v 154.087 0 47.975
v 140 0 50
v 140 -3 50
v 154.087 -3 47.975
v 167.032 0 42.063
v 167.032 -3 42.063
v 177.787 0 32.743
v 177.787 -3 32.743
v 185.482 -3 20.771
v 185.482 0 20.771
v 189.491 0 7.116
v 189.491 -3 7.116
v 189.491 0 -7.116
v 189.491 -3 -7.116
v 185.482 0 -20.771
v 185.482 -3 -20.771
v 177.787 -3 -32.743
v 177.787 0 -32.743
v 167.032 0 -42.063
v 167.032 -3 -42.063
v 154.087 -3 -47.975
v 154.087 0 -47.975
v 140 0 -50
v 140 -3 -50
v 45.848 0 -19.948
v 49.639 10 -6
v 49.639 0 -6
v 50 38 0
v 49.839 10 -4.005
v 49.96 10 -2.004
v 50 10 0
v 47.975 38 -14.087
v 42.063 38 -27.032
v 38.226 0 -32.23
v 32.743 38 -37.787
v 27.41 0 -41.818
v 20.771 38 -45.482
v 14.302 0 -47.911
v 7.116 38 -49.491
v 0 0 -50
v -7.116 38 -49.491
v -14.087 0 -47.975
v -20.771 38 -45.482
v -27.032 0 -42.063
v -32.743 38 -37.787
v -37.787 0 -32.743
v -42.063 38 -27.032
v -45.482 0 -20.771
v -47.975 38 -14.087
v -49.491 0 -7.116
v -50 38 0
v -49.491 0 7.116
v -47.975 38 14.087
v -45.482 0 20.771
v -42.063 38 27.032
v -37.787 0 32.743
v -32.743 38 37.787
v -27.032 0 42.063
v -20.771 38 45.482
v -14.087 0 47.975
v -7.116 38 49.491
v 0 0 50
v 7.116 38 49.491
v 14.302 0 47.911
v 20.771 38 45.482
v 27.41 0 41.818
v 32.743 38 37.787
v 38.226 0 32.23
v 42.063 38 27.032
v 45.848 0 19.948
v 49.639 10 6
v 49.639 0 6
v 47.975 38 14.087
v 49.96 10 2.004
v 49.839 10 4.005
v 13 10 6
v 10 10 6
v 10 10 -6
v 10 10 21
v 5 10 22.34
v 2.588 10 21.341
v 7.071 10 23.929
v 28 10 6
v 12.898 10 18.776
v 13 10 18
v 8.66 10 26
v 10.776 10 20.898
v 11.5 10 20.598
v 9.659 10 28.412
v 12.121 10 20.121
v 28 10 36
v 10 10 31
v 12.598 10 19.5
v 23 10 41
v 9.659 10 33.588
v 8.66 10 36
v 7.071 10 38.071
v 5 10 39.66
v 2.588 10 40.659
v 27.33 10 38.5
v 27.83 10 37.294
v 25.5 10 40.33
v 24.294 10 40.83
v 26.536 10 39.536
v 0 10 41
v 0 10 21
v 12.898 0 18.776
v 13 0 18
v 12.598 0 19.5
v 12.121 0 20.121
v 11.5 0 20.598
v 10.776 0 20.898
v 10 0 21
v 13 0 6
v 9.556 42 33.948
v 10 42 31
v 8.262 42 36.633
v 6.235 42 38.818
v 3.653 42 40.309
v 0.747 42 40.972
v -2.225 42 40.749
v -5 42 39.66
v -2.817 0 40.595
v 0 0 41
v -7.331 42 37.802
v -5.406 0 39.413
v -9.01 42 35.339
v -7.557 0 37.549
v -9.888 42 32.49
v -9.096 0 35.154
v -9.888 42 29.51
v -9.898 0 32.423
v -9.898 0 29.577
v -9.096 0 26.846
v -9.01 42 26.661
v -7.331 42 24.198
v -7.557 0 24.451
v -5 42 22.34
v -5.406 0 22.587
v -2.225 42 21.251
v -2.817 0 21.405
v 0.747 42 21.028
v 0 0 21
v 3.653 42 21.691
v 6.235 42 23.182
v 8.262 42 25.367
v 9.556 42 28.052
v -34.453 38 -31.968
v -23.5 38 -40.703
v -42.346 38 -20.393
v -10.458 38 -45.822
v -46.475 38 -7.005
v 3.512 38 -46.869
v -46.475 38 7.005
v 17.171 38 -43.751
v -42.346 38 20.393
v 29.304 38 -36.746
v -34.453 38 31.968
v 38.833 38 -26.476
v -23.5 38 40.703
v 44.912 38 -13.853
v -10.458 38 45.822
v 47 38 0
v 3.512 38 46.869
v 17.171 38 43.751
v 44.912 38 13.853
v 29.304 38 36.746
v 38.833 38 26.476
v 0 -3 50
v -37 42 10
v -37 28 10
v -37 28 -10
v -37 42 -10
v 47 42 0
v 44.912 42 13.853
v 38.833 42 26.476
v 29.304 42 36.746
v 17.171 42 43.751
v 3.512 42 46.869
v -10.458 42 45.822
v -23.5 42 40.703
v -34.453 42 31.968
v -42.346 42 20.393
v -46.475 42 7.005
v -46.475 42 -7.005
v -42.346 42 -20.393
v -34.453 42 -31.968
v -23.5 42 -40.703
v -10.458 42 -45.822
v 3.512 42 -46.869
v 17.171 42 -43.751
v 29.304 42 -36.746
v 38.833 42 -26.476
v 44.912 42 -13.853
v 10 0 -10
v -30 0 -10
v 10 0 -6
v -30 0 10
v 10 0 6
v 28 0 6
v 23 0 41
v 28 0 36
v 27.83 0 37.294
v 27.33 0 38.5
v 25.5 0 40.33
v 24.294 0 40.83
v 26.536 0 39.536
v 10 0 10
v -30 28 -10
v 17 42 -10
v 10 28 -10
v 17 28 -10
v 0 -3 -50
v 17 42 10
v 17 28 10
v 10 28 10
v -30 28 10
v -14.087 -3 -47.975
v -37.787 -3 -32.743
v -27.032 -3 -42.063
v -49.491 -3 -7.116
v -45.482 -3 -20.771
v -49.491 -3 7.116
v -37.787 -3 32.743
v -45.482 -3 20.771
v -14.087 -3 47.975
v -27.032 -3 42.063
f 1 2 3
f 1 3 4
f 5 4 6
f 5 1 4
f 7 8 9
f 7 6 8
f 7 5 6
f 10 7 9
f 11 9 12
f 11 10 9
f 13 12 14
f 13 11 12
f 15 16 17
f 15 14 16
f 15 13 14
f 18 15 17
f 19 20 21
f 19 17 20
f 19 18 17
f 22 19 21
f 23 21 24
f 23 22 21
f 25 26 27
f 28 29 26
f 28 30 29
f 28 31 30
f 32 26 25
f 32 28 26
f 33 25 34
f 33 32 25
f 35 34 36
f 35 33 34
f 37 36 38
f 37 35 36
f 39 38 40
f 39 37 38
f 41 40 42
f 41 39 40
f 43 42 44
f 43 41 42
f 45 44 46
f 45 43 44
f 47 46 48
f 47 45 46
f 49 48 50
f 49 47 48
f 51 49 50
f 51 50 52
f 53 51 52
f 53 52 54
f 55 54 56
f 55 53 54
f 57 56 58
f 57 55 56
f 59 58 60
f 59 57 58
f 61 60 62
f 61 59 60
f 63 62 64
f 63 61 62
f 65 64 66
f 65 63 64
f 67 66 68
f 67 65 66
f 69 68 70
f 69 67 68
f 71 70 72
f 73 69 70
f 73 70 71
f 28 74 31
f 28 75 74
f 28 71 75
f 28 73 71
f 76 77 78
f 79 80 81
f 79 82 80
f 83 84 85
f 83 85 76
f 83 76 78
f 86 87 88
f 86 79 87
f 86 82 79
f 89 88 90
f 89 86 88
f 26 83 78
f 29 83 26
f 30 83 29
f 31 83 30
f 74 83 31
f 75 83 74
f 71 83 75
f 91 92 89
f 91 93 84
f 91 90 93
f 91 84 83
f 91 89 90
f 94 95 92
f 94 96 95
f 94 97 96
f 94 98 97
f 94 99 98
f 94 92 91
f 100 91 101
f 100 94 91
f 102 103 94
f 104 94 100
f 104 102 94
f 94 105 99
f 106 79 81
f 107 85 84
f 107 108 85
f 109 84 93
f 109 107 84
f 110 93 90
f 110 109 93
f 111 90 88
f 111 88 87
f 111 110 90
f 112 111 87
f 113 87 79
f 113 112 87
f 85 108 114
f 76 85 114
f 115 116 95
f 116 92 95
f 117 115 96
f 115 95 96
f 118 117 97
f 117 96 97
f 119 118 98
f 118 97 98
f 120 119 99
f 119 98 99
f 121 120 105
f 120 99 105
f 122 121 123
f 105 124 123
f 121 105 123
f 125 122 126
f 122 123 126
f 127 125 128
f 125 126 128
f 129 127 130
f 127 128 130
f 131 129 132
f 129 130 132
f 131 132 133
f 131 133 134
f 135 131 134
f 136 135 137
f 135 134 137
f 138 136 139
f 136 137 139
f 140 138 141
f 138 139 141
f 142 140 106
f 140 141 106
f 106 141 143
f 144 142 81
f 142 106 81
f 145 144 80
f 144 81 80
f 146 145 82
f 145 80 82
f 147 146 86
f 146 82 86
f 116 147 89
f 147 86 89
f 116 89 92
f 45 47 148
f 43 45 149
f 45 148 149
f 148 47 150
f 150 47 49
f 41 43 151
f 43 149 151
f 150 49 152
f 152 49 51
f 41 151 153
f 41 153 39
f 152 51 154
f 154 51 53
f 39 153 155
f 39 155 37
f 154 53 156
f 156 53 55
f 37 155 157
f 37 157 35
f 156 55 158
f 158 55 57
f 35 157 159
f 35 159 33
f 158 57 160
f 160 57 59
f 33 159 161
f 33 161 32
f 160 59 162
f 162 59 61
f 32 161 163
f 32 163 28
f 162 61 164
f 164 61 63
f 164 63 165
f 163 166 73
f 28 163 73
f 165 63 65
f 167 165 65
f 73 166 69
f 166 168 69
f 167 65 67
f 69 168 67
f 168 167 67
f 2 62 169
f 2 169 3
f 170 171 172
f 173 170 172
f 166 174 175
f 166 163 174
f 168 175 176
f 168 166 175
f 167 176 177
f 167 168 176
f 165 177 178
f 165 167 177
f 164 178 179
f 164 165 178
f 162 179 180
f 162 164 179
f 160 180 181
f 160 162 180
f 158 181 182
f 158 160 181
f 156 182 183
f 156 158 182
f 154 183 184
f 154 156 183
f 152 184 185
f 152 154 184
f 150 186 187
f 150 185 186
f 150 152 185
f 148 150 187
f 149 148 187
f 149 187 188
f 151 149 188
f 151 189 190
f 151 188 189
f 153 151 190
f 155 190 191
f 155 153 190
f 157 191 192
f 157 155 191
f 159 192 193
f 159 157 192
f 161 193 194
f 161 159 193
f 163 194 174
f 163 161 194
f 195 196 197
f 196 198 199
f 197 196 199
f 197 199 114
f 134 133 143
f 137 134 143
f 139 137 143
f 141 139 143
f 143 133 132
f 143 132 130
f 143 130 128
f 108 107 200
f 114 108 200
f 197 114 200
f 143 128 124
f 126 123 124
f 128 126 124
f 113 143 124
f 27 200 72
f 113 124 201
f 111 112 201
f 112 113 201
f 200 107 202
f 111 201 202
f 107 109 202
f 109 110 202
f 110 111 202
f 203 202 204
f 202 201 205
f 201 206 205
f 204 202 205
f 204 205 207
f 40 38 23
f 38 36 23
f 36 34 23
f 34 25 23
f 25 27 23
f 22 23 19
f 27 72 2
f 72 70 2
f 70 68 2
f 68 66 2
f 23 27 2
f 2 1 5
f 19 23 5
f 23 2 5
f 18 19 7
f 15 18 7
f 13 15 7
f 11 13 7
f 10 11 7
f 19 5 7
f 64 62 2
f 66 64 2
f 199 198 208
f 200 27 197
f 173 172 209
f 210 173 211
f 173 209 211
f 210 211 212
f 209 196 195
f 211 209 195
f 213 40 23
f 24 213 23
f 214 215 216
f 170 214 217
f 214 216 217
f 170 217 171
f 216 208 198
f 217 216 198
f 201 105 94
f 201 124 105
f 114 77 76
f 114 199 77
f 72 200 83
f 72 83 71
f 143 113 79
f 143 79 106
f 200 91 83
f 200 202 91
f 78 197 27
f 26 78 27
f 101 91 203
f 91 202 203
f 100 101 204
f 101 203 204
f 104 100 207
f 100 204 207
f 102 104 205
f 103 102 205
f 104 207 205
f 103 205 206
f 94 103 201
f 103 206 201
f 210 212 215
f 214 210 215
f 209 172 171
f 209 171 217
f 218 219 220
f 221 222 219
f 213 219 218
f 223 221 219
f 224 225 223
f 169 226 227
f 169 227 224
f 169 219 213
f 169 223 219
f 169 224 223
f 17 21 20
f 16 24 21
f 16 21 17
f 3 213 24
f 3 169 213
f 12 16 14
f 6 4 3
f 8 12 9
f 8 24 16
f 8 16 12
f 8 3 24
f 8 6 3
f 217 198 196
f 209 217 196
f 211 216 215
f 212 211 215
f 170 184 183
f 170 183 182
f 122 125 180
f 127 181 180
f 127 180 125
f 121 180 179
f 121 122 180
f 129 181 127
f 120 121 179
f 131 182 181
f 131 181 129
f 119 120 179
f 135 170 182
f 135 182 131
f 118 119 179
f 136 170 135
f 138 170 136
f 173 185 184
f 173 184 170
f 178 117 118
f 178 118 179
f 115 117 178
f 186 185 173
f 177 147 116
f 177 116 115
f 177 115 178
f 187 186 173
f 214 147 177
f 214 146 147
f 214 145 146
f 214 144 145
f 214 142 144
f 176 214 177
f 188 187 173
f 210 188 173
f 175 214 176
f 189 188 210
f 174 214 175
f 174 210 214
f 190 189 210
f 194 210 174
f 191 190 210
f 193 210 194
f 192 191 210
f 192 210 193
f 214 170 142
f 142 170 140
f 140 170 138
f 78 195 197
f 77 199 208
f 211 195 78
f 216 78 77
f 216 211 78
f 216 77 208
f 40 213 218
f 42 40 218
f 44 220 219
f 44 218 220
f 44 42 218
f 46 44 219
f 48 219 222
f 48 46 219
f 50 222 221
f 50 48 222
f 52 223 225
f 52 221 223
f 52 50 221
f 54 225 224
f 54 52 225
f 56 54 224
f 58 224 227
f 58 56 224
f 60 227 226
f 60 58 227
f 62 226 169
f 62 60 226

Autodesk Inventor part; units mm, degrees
ref_plane "YZ Plane" through (0, 0, 0) normal (1, 0, 0) x (0, 1, 0)
ref_plane "XZ Plane" through (0, 0, 0) normal (0, 1, 0) x (-1, 0, 0)
ref_plane "XY Plane" through (0, 0, 0) normal (0, 0, 1) x (1, 0, 0)
sketch "Sketch1" plane through (0, 0, 0) normal (0, 0, 1) x (1, 0, 0)
  line L0 (0, 0) -> (50, 0)
  line L1 (50, 0) -> (50, 38)
  line L2 (50, 38) -> (0, 38)
  line L3 (0, 38) -> (0, 0)
  dimension "d0" = 100
  dimension "d1" = 38
revolve "Revolution1" add sketch "Sketch1" angle 360 about axis through (0, 38, 0) along (0, -1, 0)
sketch "Sketch2" plane through (0, 38, 0) normal (0, 1, 0) x (1, 0, 0)
  line L0 (-30, 10) -> (10, 10)
  line L1 (10, 10) -> (10, -10)
  line L2 (10, -10) -> (-30, -10)
  line L3 (-30, -10) -> (-30, 10)
  line L4 (10, -10) -> (17, -10)
  line L5 (17, -10) -> (17, 10)
  line L6 (17, 10) -> (10, 10)
  line L7 (10, 10) -> (10, -10)
  line L8 (-30, -10) -> (-37, -10)
  line L9 (-37, -10) -> (-37, 10)
  line L10 (-37, 10) -> (-30, 10)
  line L11 (-30, 10) -> (-30, -10)
  point P0 (0, 0)
  dimension "d3" = 10
  dimension "d4" = 40
  dimension "d5" = 20
  dimension "d6" = 10
  dimension "d7" = 7
  dimension "d8" = 7
extrude "Extrusion1" cut sketch "Sketch2" against normal blind 38 contours L0 L1 L2 L3
extrude "Extrusion2" cut sketch "Sketch2" against normal blind 10 contours L3 L8 L9 L10 | L6 L5 L4 L1
sketch "Sketch3" plane through (0, 0, 0) normal (0, -1, 0) x (1, 0, 0)
  line L0 (10, 10) -> (10, -10) projected
  line L1 (10, 6) -> (10, -6)
  line L2 (10, -6) -> (49.6387, -6)
  line L3 (10, 6) -> (49.6387, 6)
  circle A0 centre (0, 0) radius 50 projected
  point P0 (0, 0)
  dimension "d13" = 12
  dimension "d14" = 6
extrude "Extrusion3" cut sketch "Sketch3" against normal blind 10 contours L3 A0 L2 L0 picked at (23.3333, 0)
sketch "Sketch4" plane through (-30, 0, -10) normal (0, -1, 0) x (1, 0, 0)
  line L0 (181, -17) -> (112, -17)
  line L1 (112, -17) -> (112, 37)
  line L2 (112, 37) -> (181, 37)
  line L3 (181, 37) -> (181, -17)
  line L4 (181, -17) -> (112, -17) construction
  line L5 (112, -17) -> (112, 37) construction
  line L6 (112, 37) -> (181, 37) construction
  line L7 (181, 37) -> (181, -17) construction
  line L8 (105, -24) -> (188, -24) construction
  line L9 (188, -24) -> (188, 44) construction
  line L10 (188, 44) -> (105, 44) construction
  line L11 (105, 44) -> (105, -24) construction
  line L12 (105, 44) -> (80, 44) construction
  line L13 (80, 44) -> (80, -24) construction
  line L14 (80, -24) -> (105, -24) construction
  line L15 (105, -24) -> (105, 44)
  arc A0 (79.6387, 4) -> (79.6387, 16) centre (30, 10) ccw projected
  arc A1 (79.6387, 16) -> (79.6387, 4) centre (30, 10) ccw projected
  circle A2 centre (30, 41) radius 10
  line L16 (30, 51) -> (53, 51)
  line L17 (58, 46) -> (58, 16)
  line L18 (40, 16) -> (79.6387, 16) projected
  line L19 (43, 28) -> (43, 16)
  line L20 (30, 10) -> (30, 41) construction
  arc A3 (58, 46) -> (53, 51) centre (53, 46) ccw
  arc A4 (43, 28) -> (40, 31) centre (40, 28) ccw
  circle A5 centre (30, 10) radius 50 projected
  line L21 (30, 60) -> (170, 60)
  line L22 (30, -40) -> (170, -40)
  arc A6 (170, -40) -> (170, 60) centre (170, 10) ccw
  line L23 (40, 31) -> (30, 31)
  point P0 (58, 51)
  dimension "d17" = 69
  dimension "d18" = 54
  dimension "d19" = 7
  dimension "d20" = 25
  dimension "d21" = 34
  dimension "d22" = 20
  dimension "d23" = 15
  dimension "d25" = 28
  dimension "d26" = 35
  dimension "d27" = 5
  dimension "d28" = 3
  dimension "d33" = 100
  dimension "d34" = 50
  dimension "d35" = 140
extrude "Extrusion4" cut sketch "Sketch4" against normal up to surface (10 mm away) contours L18 L19 A4 L23 A2 L16 A3 L17 | A2
sketch "Sketch5" plane through (0, 10, 0) normal (0, -1, 0) x (1, 0, 0)
  circle A0 centre (0, 31) radius 10
  arc A1 (0, 41) -> (0, 21) centre (0, 31) ccw projected
  point P0 (0, 0)
  dimension "d39" = 20
extrude "Extrusion5" cut sketch "Sketch5" against normal through all
extrude "Extrusion6" add sketch "Sketch4" along normal blind 3 contours L0 L1 L2 L3 | L18 L19 A4 L23 A2 L16 A3 L17 | A1 A0 | A0 A1 L21 A6 L22 | A2
sketch "Sketch6" plane through (0, 38, 0) normal (0, 1, 0) x (1, 0, 0)
  line L0 (-37, -10) -> (-37, 10) projected
  line L1 (17, -10) -> (-37, -10) projected
  line L2 (-37, 10) -> (17, 10) projected
  line L3 (17, 10) -> (17, -10) projected
  circle A0 centre (0, -31) radius 10 projected
  circle A1 centre (0, -31) radius 10 projected
  line L4 (17, -10) -> (-37, -10) projected
  line L5 (-37, -10) -> (-37, 10) projected
  line L6 (-37, 10) -> (17, 10) projected
  line L7 (17, 10) -> (17, -10) projected
  circle A2 centre (0, 0) radius 50 projected
  circle A3 centre (0, 0) radius 47
  point P0 (0, 0)
  dimension "d40" = 94
extrude "Extrusion7" add sketch "Sketch6" along normal blind 4 contours A3
equation "\"d14\" = 0.5 * d13"
equation "\"d21\" = d19 + 0.5 * d18"
equation "\"d34\" = 0.5 * d33"
equation "\"d39\" = d22"
properties part number "Base v0,1"
